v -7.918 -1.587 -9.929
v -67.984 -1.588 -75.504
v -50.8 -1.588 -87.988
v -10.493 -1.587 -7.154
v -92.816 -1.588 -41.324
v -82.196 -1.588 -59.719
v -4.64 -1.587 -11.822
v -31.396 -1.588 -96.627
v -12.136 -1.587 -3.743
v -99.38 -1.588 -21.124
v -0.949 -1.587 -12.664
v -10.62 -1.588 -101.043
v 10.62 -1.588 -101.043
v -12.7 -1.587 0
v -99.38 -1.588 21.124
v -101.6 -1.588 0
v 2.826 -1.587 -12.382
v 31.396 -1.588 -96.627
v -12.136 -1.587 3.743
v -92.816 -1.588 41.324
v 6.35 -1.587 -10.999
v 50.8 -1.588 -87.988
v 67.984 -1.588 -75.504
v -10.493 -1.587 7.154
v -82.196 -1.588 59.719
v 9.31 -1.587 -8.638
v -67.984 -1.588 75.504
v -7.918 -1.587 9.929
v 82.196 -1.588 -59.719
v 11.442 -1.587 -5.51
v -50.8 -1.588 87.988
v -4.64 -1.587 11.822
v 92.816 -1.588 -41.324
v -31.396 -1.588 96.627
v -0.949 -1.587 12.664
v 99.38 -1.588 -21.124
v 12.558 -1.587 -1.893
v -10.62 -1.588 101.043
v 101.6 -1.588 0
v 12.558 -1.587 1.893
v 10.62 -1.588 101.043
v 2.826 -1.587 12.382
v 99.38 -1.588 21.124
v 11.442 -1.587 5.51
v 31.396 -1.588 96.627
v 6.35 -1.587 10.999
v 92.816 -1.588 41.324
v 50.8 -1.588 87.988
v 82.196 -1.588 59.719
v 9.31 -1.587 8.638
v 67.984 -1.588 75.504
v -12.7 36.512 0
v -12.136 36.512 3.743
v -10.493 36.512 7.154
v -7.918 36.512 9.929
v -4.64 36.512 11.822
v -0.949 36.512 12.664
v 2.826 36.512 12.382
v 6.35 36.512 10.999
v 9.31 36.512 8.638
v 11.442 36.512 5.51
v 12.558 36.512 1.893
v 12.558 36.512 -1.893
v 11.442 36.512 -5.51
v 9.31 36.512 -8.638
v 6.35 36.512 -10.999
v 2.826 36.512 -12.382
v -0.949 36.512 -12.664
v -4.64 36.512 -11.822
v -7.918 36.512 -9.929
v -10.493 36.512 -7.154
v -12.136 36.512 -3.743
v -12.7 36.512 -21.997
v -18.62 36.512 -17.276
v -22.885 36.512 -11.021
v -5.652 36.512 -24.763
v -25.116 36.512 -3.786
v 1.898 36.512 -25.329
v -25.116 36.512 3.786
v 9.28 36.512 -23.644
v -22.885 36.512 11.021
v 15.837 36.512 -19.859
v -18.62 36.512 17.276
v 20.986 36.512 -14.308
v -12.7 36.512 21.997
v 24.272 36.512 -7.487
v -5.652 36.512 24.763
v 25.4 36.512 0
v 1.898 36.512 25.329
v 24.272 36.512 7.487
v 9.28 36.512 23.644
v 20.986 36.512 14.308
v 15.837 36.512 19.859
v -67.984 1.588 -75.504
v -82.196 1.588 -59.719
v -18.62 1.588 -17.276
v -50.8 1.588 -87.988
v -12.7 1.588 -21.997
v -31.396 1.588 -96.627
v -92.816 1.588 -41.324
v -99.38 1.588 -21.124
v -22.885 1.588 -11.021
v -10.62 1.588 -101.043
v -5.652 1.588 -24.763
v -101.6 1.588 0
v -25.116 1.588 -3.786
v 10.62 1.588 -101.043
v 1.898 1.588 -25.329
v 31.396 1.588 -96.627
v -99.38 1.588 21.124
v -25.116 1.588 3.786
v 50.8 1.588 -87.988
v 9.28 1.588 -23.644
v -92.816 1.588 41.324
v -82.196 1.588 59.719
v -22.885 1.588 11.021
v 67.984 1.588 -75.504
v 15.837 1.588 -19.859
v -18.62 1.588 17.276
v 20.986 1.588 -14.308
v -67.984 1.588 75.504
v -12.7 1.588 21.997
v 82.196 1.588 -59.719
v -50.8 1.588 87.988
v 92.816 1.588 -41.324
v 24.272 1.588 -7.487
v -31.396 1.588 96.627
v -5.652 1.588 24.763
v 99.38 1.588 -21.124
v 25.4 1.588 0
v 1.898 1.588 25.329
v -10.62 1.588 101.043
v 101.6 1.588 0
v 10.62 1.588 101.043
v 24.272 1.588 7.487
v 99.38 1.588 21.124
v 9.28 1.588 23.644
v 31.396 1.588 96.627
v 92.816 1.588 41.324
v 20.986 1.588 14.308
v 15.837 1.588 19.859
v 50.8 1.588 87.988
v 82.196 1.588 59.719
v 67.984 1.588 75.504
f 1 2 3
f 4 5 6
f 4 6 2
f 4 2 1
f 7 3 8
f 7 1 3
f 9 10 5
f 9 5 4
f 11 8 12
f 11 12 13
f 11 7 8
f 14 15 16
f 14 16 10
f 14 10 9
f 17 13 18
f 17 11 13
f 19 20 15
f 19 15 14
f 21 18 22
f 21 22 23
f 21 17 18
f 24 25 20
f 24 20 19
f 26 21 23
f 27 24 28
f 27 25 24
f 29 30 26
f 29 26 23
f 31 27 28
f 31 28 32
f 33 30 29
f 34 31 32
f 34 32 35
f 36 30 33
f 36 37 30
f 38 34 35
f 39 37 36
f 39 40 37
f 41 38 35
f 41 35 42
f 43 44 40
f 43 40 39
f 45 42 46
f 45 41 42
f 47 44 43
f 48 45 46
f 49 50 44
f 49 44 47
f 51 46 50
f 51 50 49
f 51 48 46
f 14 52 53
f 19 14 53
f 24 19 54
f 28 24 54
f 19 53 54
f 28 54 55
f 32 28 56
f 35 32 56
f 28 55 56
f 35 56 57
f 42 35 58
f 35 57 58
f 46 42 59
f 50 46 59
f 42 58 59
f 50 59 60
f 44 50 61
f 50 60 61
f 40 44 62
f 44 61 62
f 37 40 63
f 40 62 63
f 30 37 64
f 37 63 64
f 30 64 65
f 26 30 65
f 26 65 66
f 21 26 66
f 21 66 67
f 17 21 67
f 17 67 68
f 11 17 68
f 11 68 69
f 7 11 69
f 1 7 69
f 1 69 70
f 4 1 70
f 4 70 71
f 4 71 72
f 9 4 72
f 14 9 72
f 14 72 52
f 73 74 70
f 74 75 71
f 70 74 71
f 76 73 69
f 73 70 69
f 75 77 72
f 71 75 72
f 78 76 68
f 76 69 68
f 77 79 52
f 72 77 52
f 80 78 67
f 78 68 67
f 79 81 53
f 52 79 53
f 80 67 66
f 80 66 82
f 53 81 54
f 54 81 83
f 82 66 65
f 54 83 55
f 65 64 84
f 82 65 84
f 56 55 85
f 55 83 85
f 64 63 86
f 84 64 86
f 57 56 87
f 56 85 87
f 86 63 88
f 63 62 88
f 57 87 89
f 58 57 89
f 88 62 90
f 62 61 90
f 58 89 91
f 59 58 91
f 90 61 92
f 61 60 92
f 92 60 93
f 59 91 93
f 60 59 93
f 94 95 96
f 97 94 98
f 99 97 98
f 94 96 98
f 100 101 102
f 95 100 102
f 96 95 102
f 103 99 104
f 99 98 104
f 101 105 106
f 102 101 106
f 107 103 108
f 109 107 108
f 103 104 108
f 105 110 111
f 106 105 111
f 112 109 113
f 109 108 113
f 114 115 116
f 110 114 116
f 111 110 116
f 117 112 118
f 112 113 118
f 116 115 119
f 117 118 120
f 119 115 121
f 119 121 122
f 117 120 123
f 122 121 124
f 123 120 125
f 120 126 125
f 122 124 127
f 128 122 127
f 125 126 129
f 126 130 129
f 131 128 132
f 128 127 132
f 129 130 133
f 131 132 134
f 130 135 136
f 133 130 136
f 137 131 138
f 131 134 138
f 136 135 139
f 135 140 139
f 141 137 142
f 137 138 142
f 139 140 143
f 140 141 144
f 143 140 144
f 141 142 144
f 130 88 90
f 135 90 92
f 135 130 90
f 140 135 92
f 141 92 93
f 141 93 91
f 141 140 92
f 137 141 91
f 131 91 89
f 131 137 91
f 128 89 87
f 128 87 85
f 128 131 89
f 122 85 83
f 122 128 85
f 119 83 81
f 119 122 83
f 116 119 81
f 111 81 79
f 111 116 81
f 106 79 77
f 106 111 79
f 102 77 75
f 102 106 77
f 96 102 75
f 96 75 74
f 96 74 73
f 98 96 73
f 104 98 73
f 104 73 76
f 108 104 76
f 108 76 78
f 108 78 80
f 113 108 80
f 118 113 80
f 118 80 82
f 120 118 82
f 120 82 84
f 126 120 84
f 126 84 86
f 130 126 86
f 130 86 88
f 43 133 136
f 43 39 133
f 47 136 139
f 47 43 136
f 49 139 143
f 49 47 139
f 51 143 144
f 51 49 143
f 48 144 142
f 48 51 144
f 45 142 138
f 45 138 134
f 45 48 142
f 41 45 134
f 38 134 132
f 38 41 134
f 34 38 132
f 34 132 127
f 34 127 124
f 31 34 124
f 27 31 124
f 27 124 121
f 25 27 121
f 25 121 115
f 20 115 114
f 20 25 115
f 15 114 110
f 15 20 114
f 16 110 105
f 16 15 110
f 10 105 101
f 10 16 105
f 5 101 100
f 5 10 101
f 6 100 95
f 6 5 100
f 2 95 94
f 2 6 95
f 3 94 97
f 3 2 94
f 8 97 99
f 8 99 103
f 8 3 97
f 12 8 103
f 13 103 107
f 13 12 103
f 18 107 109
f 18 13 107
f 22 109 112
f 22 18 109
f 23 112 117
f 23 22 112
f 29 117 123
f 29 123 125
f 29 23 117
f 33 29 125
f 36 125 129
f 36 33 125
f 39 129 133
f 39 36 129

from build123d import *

# Parameters (mm, degrees)
F0_R     = 101.6
F1_DEPTH = 1.5875
F2_R     = 25.4
F3_DEPTH = 38.1
F4_R     = 12.7
F5_DEPTH = 63.5
F6_R     = 12.7
F7_DEPTH = 63.5


with BuildPart() as f1:
    # F0 (on Front) → F1 (new body, symmetric)
    with BuildSketch(Plane.XZ):
        Circle(F0_R)
    extrude(amount=F1_DEPTH, both=True)

    # F2 (on face) → F3 (join)
    with BuildSketch(Plane.XZ.offset(1.5875)):
        Circle(F2_R)
    extrude(amount=-F3_DEPTH)

    # F4 (on face) → F5 (cut)
    with BuildSketch(Plane(origin=(0, 36.5125, 0), x_dir=(-1, 0, 0), z_dir=(0, 1, 0))):
        Circle(F4_R)
    extrude(amount=F5_DEPTH, mode=Mode.SUBTRACT)

    # F6 (on face) → F7 (cut)
    with BuildSketch(Plane(origin=(0, 36.5125, 0), x_dir=(-1, 0, 0), z_dir=(0, 1, 0))):
        Circle(F6_R)
    extrude(amount=-F7_DEPTH, mode=Mode.SUBTRACT)


solid = f1.part
